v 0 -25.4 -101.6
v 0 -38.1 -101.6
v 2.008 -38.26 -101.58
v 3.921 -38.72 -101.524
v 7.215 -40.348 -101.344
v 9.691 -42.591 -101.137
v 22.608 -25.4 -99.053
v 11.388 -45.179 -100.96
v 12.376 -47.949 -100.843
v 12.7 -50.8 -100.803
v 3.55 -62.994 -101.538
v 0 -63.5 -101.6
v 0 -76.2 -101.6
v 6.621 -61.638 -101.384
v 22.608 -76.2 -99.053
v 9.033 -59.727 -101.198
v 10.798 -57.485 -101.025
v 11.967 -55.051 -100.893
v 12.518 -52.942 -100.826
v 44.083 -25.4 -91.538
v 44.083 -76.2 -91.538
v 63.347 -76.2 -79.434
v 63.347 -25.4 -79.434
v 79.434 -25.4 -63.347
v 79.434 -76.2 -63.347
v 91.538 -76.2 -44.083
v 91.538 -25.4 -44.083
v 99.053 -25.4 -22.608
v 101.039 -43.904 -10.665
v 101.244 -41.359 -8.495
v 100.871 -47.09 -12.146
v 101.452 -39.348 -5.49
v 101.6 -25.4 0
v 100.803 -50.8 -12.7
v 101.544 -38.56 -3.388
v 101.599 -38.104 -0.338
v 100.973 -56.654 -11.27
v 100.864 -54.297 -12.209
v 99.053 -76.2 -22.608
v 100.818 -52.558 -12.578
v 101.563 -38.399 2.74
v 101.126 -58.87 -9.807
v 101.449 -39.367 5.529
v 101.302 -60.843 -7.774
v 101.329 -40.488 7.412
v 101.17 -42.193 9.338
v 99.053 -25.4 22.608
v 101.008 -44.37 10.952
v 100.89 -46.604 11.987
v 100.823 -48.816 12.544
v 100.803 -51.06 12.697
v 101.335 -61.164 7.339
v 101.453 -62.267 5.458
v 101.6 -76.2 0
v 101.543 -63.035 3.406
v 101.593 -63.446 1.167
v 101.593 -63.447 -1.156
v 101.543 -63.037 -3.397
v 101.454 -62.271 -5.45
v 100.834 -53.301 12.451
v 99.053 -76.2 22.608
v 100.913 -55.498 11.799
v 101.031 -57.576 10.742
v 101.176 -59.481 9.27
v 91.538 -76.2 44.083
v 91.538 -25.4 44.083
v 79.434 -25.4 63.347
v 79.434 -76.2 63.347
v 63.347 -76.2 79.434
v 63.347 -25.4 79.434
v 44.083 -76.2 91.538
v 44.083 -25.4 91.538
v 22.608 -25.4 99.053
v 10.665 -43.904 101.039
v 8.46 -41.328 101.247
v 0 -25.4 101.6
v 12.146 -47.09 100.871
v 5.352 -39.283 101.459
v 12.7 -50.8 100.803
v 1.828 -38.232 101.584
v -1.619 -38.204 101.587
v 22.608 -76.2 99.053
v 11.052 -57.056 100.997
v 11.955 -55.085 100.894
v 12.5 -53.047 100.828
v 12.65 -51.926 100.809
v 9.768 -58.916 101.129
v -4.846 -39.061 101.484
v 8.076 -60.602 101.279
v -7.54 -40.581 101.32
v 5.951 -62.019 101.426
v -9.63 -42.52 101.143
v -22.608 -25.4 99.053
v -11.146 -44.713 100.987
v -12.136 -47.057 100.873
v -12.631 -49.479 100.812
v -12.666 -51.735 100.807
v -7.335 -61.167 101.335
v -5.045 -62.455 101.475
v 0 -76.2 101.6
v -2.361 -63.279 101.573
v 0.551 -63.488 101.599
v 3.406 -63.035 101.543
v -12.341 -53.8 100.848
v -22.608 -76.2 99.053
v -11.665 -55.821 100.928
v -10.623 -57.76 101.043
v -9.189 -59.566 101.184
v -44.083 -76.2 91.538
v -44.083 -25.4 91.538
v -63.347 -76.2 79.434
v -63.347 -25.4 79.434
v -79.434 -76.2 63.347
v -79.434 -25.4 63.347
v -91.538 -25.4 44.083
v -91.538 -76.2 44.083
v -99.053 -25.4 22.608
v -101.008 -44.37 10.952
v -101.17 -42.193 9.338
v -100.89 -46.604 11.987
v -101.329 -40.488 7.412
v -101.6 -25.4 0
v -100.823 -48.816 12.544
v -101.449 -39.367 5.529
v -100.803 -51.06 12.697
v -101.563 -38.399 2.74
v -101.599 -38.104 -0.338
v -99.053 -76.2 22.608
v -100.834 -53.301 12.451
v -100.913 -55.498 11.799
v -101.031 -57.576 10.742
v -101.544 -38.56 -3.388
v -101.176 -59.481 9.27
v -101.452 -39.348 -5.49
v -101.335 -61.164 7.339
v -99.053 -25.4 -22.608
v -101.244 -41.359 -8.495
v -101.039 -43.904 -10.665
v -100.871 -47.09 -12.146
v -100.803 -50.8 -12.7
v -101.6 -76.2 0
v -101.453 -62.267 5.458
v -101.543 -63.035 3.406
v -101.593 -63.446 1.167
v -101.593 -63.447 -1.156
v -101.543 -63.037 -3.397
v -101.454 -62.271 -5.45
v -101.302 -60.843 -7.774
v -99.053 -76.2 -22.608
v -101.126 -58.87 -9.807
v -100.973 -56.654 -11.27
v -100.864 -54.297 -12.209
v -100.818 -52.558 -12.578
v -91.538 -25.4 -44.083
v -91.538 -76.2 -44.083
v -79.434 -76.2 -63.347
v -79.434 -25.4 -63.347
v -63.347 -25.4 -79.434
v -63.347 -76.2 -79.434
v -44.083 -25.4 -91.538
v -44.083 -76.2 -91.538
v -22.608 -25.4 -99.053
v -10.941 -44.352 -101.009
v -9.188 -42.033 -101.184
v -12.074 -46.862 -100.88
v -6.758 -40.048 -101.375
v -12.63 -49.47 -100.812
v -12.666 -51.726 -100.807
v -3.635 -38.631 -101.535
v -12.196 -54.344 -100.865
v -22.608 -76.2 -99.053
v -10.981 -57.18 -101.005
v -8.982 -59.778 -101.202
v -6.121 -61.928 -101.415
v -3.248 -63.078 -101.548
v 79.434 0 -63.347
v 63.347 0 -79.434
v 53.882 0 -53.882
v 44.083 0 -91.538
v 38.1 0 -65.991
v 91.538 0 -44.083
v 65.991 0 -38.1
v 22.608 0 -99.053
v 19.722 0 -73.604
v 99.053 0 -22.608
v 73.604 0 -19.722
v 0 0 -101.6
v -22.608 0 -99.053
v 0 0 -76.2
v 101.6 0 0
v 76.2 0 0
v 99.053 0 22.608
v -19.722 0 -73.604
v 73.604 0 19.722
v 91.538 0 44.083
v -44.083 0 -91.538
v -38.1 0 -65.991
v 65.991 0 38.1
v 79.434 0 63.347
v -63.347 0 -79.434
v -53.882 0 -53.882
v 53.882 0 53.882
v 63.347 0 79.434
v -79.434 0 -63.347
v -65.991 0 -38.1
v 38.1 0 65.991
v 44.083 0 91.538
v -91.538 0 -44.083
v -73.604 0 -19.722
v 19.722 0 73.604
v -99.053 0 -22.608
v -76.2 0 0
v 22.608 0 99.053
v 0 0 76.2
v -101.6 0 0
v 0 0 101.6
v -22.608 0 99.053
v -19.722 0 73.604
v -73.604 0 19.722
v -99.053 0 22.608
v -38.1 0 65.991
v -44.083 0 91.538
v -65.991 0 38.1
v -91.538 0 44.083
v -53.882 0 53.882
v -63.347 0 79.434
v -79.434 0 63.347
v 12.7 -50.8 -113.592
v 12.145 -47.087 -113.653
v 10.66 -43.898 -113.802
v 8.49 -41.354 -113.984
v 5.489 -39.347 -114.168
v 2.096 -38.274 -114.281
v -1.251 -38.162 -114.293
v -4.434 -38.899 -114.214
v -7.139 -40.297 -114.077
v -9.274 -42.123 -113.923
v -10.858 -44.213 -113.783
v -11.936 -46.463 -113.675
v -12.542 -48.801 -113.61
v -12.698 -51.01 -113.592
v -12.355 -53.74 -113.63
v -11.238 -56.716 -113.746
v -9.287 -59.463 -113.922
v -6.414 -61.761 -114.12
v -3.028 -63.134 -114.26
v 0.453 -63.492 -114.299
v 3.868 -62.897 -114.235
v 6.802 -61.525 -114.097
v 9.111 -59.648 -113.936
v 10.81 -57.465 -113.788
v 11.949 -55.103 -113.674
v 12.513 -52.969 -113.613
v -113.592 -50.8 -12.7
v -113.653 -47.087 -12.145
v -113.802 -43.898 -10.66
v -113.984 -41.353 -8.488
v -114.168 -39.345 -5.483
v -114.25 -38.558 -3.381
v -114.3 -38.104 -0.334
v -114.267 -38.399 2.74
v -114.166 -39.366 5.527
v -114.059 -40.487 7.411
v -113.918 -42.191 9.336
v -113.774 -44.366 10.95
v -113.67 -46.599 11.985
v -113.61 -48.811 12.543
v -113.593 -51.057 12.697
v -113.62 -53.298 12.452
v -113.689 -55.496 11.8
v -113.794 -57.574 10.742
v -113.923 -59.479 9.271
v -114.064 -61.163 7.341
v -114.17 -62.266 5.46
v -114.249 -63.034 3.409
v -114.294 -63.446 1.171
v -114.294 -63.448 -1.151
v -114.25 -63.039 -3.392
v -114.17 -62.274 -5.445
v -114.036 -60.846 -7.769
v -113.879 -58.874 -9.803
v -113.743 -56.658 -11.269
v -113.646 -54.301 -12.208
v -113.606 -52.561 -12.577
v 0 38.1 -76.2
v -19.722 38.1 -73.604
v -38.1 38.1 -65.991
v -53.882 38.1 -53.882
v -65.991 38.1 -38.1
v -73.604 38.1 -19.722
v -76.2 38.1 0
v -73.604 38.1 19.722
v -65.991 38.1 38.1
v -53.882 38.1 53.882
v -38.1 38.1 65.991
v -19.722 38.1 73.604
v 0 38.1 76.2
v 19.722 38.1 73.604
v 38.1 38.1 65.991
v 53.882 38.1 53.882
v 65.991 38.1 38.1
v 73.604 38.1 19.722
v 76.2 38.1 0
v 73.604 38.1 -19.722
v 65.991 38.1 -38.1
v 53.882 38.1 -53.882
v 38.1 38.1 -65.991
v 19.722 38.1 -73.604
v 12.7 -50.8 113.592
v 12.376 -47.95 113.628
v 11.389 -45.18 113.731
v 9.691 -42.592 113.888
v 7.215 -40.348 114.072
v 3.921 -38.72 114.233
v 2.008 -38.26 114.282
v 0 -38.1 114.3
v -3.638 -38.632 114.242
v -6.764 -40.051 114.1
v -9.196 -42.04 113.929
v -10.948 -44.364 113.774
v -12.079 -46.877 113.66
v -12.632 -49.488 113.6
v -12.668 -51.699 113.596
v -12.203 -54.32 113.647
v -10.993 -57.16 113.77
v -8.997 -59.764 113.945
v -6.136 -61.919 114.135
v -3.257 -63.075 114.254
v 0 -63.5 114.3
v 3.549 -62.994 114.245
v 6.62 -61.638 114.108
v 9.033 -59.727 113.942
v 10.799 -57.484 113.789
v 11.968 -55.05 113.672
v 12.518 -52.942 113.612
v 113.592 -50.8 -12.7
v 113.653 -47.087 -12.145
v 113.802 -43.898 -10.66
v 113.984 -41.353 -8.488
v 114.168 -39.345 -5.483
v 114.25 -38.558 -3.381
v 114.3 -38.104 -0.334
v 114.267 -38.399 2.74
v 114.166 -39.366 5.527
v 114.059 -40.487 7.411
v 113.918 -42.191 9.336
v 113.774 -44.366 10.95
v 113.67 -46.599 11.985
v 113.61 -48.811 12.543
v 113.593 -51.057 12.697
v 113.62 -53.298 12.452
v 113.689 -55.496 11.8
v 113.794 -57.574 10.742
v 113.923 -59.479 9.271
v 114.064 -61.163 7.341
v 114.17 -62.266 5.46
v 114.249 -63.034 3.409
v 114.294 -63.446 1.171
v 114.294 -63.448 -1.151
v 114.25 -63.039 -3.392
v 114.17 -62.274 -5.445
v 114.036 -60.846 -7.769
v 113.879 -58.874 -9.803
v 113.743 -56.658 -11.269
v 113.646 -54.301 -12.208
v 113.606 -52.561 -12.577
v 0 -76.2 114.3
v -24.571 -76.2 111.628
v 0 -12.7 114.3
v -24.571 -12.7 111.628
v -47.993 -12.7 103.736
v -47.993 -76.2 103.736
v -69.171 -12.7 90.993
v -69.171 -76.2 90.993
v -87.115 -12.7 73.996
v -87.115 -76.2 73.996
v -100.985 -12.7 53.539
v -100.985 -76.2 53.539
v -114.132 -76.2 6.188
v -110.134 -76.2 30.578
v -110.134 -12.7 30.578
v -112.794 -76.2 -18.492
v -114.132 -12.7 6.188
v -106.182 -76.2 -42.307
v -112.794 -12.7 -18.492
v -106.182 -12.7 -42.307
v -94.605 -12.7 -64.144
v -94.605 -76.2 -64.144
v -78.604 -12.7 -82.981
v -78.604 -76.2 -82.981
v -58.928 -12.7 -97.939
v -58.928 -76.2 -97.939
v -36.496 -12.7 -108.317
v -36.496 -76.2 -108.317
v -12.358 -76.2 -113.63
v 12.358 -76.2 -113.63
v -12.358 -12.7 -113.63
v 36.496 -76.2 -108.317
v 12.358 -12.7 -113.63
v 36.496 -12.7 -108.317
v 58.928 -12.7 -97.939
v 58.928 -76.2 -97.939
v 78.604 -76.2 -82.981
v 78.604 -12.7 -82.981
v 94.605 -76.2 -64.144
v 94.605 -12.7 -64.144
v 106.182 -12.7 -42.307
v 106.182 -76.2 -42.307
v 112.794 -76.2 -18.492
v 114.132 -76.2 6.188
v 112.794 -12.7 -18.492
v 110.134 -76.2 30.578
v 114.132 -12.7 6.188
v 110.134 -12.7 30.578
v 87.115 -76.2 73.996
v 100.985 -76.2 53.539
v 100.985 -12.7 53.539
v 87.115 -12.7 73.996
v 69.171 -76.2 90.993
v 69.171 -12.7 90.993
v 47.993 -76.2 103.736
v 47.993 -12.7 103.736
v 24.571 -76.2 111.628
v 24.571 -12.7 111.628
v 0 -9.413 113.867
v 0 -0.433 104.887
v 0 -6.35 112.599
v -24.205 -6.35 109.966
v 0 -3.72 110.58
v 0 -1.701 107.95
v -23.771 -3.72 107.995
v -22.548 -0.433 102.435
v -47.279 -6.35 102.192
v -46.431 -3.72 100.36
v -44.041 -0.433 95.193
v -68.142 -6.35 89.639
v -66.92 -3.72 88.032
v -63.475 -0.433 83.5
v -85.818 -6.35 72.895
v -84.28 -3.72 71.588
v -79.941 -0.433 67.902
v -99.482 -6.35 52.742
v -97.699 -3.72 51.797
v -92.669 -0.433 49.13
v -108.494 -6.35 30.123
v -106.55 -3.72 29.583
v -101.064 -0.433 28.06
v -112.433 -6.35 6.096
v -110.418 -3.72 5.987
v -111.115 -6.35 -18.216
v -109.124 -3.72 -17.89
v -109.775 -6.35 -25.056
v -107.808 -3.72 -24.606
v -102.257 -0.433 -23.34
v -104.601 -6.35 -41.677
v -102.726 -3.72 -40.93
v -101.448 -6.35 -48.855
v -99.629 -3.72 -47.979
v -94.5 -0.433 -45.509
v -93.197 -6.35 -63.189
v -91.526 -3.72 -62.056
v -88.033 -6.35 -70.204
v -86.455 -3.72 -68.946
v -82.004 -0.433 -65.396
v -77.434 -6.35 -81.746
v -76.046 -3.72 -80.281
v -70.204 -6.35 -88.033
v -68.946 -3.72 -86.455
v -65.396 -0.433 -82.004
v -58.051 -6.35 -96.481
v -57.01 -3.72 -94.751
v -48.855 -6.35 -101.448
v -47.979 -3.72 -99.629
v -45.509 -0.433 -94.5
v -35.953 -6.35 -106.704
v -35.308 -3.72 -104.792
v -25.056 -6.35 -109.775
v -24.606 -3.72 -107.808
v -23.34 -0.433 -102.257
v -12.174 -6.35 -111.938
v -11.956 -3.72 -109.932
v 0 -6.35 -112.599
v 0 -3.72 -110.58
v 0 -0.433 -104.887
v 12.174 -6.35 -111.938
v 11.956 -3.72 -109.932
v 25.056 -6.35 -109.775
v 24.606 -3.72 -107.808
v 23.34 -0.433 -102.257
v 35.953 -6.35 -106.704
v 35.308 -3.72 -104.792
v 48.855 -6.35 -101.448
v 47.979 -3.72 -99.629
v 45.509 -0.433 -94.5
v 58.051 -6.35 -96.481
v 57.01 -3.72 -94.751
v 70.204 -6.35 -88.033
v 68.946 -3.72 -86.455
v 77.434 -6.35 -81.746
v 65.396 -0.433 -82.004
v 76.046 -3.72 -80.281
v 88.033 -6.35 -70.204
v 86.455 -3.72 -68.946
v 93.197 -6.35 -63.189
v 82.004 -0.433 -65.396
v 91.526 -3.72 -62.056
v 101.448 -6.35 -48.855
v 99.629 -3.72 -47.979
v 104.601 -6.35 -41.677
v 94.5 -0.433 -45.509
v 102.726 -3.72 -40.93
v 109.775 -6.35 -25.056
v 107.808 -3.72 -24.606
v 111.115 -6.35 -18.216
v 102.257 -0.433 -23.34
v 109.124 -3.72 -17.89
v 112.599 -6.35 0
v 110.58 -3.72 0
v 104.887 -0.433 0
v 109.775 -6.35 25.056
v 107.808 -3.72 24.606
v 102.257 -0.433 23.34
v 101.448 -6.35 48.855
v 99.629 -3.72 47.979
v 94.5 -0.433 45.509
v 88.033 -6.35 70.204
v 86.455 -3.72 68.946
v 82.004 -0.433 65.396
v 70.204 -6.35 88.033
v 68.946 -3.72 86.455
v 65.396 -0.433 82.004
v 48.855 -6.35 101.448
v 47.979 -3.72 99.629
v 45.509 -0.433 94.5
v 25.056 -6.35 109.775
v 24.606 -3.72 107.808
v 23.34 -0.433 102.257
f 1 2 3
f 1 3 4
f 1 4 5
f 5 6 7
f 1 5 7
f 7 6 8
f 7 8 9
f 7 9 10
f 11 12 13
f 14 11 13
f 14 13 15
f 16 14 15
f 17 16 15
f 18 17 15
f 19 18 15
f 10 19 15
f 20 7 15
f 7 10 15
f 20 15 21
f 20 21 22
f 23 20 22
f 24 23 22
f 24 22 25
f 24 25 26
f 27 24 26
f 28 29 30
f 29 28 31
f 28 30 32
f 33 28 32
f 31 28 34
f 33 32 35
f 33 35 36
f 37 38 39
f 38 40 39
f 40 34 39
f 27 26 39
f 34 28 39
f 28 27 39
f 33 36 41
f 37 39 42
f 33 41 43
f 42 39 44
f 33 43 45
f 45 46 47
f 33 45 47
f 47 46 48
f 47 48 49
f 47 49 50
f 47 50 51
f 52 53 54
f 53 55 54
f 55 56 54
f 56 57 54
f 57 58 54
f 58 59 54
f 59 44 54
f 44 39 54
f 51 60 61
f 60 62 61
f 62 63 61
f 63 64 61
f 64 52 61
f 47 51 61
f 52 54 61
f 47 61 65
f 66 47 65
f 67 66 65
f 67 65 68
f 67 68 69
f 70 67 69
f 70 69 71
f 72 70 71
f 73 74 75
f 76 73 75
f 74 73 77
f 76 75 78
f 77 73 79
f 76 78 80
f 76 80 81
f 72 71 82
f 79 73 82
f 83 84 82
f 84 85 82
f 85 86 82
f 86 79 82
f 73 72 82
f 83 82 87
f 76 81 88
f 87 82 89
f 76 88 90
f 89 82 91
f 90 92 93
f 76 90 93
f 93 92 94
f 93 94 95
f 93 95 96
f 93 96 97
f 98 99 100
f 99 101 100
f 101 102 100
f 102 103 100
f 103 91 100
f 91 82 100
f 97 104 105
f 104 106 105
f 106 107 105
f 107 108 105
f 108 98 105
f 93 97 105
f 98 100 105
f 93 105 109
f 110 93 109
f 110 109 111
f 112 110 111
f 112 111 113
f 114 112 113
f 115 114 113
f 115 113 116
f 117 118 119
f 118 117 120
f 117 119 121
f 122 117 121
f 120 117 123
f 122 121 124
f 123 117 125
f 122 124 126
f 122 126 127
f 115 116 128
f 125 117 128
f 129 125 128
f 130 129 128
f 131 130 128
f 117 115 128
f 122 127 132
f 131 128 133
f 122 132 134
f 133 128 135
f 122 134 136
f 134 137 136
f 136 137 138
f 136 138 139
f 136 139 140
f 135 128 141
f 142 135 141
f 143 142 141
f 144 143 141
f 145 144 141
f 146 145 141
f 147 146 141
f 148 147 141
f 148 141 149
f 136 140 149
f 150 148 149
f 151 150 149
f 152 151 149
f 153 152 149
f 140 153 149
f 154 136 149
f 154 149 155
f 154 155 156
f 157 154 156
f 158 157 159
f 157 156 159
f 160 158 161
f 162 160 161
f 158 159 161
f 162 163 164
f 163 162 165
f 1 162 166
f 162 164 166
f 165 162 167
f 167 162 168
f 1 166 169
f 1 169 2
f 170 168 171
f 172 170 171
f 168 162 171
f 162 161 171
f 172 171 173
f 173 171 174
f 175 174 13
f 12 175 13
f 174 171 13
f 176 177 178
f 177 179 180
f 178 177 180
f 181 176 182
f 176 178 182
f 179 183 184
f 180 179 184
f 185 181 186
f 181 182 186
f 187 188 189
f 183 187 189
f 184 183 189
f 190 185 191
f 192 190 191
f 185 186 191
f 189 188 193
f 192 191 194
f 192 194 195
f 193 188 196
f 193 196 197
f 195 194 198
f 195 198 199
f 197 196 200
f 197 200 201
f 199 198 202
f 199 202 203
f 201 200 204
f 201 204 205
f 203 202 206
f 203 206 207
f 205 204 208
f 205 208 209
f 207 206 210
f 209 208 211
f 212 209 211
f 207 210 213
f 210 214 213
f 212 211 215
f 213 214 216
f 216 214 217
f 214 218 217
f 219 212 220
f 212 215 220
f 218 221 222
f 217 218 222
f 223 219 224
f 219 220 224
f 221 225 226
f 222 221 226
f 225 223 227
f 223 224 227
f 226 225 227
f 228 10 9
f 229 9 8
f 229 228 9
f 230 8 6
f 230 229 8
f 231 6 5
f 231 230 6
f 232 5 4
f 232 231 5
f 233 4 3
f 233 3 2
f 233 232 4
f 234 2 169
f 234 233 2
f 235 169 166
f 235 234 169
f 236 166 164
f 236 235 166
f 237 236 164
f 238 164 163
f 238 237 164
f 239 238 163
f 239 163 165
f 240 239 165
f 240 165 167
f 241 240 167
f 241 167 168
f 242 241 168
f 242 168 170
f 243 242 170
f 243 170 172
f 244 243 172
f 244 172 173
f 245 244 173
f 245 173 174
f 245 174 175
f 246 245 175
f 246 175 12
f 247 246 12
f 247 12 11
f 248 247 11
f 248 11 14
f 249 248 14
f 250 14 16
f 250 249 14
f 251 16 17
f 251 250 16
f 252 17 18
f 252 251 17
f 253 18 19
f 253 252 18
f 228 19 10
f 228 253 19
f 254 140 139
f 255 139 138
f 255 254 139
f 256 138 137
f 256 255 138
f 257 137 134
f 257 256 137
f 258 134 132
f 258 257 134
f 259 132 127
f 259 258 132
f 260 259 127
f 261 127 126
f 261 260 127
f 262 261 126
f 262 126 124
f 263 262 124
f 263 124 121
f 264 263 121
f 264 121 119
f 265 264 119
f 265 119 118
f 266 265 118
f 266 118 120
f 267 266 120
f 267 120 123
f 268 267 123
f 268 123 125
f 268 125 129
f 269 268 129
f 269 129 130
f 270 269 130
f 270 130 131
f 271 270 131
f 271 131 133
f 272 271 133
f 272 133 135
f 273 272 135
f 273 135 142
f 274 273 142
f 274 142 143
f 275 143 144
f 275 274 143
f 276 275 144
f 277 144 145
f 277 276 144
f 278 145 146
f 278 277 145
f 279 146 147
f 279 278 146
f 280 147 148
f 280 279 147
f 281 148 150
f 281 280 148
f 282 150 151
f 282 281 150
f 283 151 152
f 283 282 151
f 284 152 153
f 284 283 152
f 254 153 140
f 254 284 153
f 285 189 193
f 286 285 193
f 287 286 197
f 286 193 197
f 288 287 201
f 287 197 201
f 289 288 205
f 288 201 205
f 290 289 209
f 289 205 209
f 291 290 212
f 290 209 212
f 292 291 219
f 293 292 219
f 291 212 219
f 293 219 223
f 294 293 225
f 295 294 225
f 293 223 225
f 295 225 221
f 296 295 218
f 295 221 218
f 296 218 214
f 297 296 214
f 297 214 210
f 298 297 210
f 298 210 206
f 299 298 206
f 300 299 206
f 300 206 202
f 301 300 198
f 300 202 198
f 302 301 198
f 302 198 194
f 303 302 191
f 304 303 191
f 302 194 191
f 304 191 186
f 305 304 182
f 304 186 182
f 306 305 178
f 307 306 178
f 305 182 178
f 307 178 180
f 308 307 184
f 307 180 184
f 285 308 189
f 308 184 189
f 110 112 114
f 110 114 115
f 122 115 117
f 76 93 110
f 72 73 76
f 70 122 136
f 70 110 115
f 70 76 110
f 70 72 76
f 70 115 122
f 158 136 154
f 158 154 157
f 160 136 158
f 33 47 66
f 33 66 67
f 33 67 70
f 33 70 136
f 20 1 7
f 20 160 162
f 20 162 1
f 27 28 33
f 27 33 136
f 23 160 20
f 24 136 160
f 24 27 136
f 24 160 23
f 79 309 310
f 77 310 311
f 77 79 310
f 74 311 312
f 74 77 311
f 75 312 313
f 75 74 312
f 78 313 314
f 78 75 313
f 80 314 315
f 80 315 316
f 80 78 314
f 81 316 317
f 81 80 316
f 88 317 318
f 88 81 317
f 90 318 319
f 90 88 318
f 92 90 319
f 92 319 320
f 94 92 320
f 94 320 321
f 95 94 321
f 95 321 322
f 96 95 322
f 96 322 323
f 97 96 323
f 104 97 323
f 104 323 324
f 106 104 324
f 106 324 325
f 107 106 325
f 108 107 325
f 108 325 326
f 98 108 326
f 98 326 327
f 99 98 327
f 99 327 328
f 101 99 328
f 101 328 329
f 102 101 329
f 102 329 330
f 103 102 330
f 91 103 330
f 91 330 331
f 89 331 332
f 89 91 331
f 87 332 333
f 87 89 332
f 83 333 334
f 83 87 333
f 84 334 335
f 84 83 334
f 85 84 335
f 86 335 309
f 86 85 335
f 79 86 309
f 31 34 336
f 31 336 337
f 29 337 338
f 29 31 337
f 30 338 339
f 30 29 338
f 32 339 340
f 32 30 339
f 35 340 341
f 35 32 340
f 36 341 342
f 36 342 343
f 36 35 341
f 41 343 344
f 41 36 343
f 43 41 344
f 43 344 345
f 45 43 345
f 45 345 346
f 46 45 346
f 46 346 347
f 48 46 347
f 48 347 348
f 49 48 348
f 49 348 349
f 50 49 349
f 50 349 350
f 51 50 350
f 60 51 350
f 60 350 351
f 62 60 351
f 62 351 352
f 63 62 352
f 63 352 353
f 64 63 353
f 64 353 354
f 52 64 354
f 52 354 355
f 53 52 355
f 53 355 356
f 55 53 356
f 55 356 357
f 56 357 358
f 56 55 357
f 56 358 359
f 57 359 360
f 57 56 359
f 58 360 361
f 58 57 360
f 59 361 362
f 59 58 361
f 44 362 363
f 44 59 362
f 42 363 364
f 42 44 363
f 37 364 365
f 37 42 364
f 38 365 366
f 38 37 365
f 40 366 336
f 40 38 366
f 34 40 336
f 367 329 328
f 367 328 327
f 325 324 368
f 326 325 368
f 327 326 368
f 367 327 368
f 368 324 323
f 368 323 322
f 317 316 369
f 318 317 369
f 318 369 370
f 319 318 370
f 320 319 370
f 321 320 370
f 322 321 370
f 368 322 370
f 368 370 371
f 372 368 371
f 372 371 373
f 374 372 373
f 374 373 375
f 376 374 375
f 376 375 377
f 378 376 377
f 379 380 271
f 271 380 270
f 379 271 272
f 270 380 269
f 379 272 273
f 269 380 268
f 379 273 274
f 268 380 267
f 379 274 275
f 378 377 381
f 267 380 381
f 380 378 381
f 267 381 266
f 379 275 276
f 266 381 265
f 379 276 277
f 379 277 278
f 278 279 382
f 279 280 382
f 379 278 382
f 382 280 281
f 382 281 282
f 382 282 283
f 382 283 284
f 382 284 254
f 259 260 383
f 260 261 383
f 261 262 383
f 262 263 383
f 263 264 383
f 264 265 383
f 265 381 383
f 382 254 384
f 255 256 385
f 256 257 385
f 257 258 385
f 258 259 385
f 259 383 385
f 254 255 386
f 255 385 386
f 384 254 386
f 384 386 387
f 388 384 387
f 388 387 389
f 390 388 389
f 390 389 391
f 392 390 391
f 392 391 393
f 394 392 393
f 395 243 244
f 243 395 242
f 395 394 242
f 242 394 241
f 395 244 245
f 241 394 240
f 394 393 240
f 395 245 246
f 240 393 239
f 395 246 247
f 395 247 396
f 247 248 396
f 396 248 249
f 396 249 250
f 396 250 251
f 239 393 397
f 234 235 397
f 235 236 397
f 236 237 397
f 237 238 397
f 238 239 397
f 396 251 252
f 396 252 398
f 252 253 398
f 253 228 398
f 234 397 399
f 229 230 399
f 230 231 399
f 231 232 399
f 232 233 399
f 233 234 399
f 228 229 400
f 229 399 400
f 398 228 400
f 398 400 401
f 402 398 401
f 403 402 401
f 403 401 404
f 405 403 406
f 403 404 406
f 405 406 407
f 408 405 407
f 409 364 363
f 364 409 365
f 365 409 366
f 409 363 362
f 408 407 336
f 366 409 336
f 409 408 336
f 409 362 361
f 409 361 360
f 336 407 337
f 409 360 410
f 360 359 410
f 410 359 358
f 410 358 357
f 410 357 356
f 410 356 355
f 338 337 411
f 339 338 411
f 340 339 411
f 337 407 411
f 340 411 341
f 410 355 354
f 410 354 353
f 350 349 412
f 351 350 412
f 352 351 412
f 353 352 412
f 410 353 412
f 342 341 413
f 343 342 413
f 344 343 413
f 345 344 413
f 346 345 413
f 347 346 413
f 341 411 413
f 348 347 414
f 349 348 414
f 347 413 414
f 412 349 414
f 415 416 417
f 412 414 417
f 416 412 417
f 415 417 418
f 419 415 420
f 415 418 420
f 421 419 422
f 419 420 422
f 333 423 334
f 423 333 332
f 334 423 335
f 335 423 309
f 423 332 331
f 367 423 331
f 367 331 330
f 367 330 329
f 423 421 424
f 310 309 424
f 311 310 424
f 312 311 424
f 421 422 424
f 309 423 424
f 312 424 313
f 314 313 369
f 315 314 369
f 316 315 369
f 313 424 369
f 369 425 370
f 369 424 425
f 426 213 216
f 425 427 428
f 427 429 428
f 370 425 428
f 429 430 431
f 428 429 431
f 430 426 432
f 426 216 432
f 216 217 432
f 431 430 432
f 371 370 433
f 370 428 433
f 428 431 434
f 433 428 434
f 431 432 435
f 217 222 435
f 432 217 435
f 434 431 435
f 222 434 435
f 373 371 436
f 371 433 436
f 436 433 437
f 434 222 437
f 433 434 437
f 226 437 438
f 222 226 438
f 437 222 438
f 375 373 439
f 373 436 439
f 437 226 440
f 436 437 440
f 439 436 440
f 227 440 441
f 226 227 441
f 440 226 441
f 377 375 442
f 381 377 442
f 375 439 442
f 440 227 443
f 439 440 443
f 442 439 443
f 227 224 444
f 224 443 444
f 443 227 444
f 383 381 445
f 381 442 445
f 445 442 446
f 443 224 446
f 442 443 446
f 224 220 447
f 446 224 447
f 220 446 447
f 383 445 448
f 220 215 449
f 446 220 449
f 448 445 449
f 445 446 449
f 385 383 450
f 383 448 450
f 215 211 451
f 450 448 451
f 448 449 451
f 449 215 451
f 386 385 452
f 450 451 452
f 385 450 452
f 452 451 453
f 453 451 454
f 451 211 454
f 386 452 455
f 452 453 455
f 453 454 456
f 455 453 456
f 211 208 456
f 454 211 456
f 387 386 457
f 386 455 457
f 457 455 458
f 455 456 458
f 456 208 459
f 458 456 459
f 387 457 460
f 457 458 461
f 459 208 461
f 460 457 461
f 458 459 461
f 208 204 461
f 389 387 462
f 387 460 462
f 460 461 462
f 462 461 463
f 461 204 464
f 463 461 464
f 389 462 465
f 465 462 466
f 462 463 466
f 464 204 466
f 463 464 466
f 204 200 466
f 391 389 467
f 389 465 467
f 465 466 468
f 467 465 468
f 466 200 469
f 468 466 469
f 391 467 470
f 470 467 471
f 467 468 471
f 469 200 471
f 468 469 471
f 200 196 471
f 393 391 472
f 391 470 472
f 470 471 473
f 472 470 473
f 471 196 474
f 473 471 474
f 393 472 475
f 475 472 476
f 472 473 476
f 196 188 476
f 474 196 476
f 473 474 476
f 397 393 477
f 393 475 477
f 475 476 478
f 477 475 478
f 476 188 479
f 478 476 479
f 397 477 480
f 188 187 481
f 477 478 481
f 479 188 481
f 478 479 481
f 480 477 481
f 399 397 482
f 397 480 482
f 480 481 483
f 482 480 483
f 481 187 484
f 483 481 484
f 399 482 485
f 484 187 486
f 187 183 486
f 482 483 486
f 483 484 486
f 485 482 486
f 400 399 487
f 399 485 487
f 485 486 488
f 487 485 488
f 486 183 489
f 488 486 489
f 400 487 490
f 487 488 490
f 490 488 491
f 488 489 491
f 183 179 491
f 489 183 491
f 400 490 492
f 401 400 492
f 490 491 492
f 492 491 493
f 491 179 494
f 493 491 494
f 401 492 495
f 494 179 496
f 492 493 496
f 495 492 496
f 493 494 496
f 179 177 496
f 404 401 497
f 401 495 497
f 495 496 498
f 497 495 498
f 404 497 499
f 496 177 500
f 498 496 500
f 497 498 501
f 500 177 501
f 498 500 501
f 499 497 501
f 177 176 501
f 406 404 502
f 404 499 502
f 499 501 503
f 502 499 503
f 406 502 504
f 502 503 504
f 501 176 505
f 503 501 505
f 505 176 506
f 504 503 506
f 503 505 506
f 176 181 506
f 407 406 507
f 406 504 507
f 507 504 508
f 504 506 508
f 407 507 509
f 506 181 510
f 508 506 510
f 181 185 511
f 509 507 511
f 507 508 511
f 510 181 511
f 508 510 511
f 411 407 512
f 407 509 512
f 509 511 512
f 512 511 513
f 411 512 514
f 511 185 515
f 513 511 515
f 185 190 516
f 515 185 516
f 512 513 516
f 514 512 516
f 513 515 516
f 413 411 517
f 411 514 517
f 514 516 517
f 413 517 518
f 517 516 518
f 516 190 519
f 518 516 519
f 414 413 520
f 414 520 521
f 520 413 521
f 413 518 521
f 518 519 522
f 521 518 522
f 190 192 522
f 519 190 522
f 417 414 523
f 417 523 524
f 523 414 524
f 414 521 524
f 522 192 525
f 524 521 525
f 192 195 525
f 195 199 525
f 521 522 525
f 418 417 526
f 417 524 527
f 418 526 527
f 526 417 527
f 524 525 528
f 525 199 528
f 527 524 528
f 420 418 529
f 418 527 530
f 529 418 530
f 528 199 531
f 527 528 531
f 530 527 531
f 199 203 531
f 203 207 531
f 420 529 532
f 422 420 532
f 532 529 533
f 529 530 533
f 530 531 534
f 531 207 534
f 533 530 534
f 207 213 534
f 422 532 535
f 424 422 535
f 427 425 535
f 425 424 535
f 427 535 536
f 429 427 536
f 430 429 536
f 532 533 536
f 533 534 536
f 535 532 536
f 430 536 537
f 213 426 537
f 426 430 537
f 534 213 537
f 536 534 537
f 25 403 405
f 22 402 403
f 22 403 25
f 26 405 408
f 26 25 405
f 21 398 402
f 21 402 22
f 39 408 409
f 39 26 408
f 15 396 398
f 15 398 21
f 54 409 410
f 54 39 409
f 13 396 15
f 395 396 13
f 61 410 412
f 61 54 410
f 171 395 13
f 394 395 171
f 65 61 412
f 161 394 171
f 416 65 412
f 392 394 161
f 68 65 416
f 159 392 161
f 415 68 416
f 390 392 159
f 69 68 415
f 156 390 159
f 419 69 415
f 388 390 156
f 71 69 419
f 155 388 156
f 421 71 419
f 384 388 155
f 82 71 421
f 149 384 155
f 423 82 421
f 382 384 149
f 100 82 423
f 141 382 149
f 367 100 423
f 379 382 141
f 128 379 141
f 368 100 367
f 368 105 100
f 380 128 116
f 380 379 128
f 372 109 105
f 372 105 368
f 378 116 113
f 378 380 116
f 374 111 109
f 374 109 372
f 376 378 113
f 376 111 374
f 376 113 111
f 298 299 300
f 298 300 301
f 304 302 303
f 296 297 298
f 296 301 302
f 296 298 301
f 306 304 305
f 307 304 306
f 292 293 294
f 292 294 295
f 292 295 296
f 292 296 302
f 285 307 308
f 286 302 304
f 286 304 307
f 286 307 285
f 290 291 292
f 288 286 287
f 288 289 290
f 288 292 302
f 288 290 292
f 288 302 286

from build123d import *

# Parameters (mm, degrees)
SKETCH1_R               = 76.2
BOSS_EXTRUDE1_DEPTH     = 38.1
SKETCH2_R               = 114.3
BOSS_EXTRUDE2_DEPTH     = 76.2
FILLET2_R               = 12.7
SKETCH3_R               = 101.6
CUT_EXTRUDE1_DEPTH      = 50.8
CUT_EXTRUDE2_DEPTH      = 179.704840513
CUT_EXTRUDE2_DEPTH_BACK = 179.704840513
SKETCH4_R               = 12.7
CUT_EXTRUDE3_DEPTH      = 179.704840621
CUT_EXTRUDE3_DEPTH_BACK = 179.704840621
SKETCH5_R               = 12.7


with BuildPart() as part:
    # Sketch1 → Boss-Extrude1 (new body)
    with BuildSketch(Plane(origin=(0, 0, 0), x_dir=(1, 0, 0), z_dir=(0, 1, 0))):
        with Locations(Location((0, 0, 0), (0, 0, 90))):
            Circle(SKETCH1_R)
    extrude(amount=BOSS_EXTRUDE1_DEPTH)

    # Sketch2 → Boss-Extrude2 (add)
    with BuildSketch(Plane.XZ):
        with Locations(Location((0, 0, 0), (0, 0, 90))):
            Circle(SKETCH2_R)
    extrude(amount=BOSS_EXTRUDE2_DEPTH)

    # Fillet2
    fillet2_edges = [part.edges().sort_by_distance(p)[0] for p in [
        (0, 0, -114.3),
    ]]
    fillet(fillet2_edges, radius=FILLET2_R)

    # Sketch3 → Cut-Extrude1 (cut)
    with BuildSketch(Plane.XZ.offset(76.2)):
        with Locations(Location((0, 0, 0), (0, 0, 270))):
            Circle(SKETCH3_R)
    extrude(amount=-CUT_EXTRUDE1_DEPTH, mode=Mode.SUBTRACT)

    # Sketch4 → Cut-Extrude2 (cut, two sides: drawn at the far end of the back side and taken through both)
    with BuildSketch(Plane(origin=(0, 0, 0), x_dir=(0, 0, -1), z_dir=(1, 0, 0)).offset(-CUT_EXTRUDE2_DEPTH_BACK)):
        with Locations((0, -50.8)):
            Circle(SKETCH4_R)
    extrude(amount=CUT_EXTRUDE2_DEPTH + CUT_EXTRUDE2_DEPTH_BACK, mode=Mode.SUBTRACT)

    # Sketch5 → Cut-Extrude3 (cut, two sides: drawn at the far end of the back side and taken through both)
    with BuildSketch(Plane.XY.offset(-CUT_EXTRUDE3_DEPTH_BACK)):
        with Locations((0, -50.8)):
            Circle(SKETCH5_R)
    extrude(amount=CUT_EXTRUDE3_DEPTH + CUT_EXTRUDE3_DEPTH_BACK, mode=Mode.SUBTRACT)


solid = part.part
